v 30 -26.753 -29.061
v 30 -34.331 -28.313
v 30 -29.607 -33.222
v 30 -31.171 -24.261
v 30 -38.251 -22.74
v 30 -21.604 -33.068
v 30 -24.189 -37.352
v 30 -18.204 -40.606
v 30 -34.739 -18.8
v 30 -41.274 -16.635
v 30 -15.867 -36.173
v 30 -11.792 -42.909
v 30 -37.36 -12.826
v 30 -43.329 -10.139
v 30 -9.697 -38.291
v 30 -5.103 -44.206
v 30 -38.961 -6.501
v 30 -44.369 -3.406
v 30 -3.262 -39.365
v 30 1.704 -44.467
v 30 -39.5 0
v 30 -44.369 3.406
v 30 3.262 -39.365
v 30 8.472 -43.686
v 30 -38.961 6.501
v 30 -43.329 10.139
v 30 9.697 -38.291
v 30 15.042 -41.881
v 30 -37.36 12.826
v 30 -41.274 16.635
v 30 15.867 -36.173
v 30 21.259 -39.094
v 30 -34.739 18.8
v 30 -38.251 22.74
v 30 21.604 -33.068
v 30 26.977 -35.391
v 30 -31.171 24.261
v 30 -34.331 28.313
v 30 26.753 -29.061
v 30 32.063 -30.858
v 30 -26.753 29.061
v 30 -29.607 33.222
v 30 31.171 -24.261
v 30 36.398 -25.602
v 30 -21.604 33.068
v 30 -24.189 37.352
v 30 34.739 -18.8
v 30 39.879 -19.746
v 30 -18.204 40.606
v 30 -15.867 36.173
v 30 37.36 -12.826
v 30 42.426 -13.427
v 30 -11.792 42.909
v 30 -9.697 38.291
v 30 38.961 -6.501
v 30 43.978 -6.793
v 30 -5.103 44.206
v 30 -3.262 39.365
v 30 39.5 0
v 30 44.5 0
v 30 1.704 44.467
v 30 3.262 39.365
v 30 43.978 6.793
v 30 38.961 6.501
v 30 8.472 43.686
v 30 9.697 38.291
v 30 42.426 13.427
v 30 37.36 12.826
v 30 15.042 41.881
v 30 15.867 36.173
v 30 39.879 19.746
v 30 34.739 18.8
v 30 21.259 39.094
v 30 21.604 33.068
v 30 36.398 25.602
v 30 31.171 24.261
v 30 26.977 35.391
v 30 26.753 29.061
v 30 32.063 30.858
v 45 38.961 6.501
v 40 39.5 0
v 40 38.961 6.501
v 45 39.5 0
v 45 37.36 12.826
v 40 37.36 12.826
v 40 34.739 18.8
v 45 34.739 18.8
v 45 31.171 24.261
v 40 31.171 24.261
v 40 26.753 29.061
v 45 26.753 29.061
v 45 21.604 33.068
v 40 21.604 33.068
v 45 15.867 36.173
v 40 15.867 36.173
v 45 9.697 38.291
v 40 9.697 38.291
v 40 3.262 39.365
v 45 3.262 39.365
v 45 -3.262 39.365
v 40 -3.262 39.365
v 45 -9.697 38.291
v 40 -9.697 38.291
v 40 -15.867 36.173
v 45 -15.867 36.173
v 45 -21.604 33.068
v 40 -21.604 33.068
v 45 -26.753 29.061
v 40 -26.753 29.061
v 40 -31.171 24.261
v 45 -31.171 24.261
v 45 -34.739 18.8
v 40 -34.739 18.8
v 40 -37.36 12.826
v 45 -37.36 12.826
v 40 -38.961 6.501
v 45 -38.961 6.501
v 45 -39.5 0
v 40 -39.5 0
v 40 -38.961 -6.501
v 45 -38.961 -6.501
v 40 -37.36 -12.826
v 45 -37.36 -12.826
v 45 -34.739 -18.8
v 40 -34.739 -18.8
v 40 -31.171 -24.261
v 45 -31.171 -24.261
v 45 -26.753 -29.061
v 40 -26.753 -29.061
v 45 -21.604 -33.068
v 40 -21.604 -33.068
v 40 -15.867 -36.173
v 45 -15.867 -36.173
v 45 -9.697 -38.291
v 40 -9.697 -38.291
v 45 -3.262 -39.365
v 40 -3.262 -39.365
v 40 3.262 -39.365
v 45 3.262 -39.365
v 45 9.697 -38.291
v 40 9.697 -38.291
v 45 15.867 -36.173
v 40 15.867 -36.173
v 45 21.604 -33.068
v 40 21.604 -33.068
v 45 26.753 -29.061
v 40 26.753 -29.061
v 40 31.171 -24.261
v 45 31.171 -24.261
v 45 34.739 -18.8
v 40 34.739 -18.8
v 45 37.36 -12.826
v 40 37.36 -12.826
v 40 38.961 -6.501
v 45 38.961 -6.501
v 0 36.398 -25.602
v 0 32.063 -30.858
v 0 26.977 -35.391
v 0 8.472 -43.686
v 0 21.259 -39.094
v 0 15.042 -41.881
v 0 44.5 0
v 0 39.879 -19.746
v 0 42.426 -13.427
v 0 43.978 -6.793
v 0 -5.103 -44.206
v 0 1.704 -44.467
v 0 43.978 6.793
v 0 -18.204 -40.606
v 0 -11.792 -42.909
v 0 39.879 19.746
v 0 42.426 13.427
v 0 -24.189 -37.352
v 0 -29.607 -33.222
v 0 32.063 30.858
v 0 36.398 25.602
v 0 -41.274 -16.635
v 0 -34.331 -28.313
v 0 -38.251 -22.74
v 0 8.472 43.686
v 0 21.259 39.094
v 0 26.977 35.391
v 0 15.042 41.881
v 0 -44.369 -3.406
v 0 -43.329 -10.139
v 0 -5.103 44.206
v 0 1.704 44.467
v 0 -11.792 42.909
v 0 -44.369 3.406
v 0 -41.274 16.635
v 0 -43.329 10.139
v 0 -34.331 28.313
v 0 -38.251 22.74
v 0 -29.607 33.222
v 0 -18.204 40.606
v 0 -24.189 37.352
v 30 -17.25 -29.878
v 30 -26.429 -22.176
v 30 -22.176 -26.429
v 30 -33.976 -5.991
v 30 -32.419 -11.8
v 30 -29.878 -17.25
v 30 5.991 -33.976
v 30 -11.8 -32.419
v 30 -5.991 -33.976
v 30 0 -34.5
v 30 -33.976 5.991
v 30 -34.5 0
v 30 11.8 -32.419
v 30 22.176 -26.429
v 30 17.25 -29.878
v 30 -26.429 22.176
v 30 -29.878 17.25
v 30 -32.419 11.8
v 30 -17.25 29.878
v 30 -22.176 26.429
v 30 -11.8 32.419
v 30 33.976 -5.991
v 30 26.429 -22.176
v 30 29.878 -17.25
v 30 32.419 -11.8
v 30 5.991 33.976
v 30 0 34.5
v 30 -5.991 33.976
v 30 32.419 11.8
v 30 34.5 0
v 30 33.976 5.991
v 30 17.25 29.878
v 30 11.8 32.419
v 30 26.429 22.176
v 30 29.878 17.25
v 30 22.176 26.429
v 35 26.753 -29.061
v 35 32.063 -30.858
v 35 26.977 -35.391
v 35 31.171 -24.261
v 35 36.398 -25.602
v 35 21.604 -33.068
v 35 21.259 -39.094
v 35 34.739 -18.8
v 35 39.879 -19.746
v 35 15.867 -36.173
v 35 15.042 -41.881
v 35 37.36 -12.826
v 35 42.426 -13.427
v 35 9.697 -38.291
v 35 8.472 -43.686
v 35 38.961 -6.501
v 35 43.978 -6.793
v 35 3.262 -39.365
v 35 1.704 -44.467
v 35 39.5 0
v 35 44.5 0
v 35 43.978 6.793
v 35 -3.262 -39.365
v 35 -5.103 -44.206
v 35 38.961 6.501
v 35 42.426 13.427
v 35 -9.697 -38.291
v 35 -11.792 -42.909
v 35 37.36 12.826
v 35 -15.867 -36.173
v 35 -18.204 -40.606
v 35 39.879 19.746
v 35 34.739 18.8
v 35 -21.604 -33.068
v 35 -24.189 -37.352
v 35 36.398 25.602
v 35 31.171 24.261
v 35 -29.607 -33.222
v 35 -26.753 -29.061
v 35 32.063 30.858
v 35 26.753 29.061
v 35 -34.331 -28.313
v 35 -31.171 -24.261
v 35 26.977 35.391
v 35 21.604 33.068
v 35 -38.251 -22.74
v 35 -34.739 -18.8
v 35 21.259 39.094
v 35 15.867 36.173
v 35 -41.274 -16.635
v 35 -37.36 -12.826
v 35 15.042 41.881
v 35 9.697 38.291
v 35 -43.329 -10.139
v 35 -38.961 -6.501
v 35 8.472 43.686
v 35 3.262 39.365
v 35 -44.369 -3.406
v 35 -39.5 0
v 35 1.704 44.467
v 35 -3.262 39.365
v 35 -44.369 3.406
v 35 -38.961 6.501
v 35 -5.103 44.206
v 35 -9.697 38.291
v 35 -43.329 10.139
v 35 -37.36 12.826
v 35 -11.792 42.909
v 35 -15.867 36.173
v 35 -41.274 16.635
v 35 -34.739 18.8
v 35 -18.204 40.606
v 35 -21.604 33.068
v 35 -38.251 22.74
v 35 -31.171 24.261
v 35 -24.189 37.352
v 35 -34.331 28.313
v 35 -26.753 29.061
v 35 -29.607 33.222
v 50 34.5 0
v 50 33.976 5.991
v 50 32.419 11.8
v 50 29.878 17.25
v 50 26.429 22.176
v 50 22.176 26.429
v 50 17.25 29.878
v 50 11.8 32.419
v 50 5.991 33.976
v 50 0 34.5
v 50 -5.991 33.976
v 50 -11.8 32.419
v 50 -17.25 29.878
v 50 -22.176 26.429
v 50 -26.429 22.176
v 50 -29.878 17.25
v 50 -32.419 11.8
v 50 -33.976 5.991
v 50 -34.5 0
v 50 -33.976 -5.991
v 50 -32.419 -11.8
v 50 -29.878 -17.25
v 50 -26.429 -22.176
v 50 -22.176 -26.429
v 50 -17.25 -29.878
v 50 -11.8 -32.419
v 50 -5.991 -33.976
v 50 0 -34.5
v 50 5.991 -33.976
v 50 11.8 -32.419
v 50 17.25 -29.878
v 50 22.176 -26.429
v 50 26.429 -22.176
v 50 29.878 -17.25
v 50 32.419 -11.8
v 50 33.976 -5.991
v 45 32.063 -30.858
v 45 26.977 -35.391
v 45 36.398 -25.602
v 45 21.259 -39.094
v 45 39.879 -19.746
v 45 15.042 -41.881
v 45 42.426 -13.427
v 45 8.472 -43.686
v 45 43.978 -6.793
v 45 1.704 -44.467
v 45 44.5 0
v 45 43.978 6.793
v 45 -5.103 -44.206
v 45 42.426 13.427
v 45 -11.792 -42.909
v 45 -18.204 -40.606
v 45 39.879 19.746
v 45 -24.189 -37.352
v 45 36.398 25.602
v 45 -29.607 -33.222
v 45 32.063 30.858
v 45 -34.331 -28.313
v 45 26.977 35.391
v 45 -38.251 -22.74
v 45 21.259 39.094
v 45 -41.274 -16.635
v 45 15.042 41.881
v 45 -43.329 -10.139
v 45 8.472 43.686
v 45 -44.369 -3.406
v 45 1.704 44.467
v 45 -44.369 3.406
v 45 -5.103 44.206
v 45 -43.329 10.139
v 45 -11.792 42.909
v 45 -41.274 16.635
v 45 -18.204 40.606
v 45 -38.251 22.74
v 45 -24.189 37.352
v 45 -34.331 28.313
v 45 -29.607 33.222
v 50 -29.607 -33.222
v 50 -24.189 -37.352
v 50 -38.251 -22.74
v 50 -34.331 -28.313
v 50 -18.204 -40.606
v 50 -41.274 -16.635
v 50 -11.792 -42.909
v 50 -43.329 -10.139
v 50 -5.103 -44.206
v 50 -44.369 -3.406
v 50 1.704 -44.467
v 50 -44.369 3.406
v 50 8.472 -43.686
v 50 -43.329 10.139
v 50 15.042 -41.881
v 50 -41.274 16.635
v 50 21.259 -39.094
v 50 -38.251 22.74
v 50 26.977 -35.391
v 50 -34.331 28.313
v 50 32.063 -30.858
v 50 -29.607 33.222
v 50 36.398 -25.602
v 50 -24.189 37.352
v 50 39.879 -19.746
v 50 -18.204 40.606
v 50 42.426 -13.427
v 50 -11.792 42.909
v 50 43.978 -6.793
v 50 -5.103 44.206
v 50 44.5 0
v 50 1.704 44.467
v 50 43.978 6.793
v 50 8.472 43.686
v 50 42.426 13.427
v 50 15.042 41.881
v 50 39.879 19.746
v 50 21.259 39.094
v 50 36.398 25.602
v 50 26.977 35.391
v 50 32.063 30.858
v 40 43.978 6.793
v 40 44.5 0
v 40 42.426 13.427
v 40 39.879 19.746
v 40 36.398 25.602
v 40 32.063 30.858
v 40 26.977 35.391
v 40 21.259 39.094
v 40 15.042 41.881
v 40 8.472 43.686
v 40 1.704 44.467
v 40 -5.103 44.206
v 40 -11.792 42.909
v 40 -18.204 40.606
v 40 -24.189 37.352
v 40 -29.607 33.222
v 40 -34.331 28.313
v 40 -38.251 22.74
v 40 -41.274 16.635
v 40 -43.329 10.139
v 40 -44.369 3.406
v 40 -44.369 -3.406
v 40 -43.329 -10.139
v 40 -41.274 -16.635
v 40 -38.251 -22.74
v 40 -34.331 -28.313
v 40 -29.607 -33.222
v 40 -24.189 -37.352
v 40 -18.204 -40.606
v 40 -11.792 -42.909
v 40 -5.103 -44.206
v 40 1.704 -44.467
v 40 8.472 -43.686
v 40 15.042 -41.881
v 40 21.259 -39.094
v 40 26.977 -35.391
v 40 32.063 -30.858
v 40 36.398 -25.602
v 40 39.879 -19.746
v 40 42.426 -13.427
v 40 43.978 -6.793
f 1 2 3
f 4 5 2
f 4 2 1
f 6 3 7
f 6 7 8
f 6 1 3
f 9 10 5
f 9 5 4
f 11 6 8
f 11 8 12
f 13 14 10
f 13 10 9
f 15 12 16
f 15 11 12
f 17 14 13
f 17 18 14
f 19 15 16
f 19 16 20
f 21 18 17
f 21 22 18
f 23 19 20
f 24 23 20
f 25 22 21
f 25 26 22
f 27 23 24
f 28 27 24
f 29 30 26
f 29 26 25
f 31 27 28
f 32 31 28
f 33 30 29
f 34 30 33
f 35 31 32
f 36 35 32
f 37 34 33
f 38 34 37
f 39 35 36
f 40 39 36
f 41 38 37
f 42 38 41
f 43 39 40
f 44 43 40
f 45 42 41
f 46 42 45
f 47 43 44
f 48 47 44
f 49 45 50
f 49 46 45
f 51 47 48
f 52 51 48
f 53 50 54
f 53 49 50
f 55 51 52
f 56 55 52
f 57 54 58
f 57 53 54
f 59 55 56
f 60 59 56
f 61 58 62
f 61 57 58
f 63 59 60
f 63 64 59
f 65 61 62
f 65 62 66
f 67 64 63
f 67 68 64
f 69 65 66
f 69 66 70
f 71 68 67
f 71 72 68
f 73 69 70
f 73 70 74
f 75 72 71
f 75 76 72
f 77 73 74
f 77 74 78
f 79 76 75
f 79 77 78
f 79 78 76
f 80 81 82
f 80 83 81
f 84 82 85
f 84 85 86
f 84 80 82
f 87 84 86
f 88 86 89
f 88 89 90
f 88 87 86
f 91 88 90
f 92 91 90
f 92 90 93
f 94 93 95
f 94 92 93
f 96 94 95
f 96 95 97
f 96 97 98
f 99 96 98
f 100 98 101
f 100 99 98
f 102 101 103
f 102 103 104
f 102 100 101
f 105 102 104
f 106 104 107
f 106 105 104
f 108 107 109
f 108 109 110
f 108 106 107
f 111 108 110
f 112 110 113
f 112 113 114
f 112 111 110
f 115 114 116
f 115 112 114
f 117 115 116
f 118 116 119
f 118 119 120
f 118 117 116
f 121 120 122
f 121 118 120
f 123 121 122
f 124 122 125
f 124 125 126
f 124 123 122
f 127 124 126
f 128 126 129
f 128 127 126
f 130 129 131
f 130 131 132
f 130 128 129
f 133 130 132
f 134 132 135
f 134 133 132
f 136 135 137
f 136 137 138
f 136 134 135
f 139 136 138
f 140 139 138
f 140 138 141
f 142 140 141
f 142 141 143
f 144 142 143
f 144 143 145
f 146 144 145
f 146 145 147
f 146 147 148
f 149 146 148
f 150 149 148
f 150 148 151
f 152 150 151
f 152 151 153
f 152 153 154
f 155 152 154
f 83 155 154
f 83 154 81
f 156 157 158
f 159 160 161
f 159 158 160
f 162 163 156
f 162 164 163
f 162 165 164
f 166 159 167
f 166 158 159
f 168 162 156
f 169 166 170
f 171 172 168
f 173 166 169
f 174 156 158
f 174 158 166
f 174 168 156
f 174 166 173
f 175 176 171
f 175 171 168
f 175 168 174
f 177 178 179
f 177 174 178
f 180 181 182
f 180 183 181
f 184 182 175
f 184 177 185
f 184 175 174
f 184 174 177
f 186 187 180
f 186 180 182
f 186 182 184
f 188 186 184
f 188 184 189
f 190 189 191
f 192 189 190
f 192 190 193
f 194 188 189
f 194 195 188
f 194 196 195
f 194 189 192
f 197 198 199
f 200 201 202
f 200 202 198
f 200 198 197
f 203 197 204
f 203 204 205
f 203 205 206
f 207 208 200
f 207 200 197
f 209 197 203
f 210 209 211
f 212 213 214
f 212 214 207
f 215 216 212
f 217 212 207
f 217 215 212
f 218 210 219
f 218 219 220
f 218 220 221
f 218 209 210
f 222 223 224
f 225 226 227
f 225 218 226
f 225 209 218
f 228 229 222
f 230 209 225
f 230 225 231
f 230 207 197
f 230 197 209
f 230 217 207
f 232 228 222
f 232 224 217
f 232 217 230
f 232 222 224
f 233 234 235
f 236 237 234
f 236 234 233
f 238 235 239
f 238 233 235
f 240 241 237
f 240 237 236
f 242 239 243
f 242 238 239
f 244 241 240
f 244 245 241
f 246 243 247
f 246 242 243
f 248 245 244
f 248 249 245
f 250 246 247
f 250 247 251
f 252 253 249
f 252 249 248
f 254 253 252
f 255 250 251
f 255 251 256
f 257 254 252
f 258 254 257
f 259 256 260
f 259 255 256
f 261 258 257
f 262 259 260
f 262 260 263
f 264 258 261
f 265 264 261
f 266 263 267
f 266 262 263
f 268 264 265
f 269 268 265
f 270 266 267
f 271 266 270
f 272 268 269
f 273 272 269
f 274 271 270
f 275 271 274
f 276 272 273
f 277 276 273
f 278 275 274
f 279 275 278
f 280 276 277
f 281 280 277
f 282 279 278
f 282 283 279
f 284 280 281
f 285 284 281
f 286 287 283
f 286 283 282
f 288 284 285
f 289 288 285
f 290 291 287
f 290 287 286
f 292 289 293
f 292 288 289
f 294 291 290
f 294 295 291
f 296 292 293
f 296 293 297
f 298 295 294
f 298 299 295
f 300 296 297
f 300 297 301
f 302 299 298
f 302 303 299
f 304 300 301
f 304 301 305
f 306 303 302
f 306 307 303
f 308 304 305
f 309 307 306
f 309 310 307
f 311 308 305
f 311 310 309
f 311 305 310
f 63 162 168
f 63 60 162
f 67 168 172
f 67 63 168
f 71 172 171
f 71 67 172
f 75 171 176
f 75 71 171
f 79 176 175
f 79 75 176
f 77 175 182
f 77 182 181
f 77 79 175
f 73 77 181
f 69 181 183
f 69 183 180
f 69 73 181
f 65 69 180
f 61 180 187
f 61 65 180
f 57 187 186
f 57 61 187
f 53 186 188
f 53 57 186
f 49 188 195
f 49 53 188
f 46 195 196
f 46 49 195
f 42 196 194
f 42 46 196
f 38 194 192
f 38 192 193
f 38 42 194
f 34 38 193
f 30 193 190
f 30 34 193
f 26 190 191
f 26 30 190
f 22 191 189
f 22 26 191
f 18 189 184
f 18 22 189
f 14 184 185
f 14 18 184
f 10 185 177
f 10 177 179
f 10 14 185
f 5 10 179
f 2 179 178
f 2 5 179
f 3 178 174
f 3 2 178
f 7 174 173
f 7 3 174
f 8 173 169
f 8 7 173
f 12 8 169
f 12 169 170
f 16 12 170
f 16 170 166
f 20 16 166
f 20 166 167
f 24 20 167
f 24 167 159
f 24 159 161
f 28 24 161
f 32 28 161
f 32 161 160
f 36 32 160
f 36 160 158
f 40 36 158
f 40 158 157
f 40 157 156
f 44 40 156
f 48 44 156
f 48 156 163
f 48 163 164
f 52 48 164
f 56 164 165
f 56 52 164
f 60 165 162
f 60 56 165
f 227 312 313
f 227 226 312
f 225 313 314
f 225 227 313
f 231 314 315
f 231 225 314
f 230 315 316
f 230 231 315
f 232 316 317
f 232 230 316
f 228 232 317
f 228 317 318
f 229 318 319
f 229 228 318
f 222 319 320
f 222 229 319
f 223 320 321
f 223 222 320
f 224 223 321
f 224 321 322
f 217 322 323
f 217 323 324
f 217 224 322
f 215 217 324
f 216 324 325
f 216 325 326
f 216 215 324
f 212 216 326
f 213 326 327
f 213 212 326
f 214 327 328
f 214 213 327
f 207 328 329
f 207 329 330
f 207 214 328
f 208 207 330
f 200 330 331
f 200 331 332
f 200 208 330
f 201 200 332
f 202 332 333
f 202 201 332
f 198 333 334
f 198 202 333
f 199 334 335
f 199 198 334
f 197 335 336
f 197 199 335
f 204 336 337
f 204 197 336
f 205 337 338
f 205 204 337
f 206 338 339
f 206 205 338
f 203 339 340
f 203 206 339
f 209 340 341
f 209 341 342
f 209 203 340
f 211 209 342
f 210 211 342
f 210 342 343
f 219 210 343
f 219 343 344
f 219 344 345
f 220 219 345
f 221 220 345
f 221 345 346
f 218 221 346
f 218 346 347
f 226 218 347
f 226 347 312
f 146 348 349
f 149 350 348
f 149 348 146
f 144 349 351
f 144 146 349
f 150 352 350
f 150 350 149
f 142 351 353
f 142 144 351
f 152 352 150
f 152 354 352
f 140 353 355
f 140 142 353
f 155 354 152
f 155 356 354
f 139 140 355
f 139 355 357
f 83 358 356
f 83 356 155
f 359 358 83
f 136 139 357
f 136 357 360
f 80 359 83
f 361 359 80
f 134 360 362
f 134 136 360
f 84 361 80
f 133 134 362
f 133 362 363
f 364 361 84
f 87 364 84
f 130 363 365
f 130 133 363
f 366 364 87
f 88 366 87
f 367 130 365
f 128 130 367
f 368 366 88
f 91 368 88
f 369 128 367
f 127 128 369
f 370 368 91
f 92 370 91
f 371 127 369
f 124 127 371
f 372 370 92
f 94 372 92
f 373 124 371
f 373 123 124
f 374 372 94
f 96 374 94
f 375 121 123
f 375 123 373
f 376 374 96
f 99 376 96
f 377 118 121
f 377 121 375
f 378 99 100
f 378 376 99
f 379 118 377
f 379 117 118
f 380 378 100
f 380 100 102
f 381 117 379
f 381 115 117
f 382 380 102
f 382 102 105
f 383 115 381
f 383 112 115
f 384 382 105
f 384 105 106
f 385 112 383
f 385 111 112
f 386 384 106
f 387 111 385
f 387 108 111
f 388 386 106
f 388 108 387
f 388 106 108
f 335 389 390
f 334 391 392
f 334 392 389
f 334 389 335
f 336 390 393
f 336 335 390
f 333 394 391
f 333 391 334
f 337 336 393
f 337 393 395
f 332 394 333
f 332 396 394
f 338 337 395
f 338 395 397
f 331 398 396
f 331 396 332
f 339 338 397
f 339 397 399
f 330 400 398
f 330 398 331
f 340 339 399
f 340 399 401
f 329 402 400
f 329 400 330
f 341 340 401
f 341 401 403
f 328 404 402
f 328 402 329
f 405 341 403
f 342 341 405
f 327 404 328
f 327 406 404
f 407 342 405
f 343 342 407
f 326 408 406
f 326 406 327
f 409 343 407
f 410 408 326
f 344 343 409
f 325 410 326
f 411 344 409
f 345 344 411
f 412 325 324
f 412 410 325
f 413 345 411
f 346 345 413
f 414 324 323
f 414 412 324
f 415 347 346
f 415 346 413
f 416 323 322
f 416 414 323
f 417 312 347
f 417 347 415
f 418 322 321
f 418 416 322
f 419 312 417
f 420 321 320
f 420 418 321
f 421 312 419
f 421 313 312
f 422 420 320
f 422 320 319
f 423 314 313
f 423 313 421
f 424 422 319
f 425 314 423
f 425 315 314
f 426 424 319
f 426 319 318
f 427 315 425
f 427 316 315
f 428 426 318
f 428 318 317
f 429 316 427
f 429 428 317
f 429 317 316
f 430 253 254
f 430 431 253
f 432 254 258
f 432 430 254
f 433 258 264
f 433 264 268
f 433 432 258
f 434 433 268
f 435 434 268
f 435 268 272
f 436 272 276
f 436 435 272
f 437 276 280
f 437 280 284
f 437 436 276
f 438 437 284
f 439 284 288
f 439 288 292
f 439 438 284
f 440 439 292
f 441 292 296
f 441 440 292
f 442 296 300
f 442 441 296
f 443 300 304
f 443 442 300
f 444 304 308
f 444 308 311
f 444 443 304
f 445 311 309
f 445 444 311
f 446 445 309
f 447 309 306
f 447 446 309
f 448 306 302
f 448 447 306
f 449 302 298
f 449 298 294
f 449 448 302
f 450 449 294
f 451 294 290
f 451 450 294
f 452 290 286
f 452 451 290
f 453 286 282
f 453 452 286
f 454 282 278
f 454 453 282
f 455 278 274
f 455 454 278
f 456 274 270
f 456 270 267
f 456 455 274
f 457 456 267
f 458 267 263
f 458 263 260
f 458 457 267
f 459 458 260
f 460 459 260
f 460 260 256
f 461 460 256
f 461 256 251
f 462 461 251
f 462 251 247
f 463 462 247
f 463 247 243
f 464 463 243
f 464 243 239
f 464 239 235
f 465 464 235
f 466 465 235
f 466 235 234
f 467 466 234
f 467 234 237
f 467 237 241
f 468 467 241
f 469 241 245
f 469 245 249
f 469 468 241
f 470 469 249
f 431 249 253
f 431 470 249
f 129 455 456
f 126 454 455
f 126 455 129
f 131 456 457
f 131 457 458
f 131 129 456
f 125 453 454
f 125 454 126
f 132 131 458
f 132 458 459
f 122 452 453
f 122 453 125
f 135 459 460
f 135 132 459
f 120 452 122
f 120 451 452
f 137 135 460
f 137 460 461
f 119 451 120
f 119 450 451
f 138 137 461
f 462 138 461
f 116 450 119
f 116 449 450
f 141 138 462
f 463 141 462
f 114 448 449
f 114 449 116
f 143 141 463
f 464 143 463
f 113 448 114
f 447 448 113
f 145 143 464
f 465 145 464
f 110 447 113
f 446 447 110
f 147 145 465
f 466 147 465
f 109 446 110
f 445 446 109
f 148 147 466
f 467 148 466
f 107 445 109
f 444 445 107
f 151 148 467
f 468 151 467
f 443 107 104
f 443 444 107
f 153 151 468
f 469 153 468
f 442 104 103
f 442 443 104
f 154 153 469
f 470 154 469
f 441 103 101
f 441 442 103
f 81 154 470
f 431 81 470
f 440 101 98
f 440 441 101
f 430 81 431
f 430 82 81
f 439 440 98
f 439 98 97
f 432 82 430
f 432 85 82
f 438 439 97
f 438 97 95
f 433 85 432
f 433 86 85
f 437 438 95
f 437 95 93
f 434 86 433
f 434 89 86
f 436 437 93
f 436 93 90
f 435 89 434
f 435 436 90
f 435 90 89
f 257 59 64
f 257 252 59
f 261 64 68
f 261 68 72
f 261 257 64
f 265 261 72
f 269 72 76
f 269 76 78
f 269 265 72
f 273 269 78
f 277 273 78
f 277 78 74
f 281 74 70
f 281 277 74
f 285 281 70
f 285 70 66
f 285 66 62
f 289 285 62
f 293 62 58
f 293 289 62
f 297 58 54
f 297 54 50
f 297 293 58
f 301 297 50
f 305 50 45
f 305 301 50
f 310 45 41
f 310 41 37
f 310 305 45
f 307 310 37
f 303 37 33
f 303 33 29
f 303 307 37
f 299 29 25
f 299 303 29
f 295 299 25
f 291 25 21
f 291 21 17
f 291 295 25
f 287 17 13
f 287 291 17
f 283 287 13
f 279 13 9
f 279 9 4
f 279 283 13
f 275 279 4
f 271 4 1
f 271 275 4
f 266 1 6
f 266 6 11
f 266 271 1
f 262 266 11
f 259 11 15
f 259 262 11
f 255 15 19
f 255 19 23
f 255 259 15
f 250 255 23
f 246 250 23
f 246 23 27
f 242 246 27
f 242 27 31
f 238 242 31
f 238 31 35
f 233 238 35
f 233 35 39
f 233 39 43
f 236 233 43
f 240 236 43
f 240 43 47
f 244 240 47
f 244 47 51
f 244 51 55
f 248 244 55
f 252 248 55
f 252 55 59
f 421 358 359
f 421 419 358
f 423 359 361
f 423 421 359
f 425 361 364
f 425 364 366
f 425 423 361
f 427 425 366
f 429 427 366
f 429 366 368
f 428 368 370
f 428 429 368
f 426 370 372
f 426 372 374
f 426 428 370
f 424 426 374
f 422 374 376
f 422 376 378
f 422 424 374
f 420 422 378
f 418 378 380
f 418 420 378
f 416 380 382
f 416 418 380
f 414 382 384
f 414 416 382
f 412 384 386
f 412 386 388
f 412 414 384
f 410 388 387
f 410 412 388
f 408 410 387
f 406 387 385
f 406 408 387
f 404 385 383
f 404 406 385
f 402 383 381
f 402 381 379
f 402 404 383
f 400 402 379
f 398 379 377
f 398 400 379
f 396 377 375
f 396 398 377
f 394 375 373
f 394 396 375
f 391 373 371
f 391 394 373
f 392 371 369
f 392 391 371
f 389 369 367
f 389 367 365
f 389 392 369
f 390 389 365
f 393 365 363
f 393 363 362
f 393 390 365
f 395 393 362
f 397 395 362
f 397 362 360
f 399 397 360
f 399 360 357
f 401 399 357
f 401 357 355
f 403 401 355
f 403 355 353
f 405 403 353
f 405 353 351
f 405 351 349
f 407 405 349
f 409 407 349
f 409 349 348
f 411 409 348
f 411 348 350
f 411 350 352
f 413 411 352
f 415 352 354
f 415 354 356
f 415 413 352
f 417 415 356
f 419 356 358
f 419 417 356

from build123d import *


with BuildPart() as part:
    # Sketch1 → Revolve1 (revolve)
    with BuildSketch(Plane.XY):
        Polygon((0, 0), (0, 44.5), (30, 44.5), (30, 39.5), (35, 39.5), (35, 44.5), (40, 44.5), (40, 39.5), (45, 39.5), (45, 44.5), (50, 44.5), (50, 34.5), (30, 34.5), (30, 0), align=None)
    revolve(axis=Axis((0, 0, 0), (1, 0, 0)))


solid = part.part
